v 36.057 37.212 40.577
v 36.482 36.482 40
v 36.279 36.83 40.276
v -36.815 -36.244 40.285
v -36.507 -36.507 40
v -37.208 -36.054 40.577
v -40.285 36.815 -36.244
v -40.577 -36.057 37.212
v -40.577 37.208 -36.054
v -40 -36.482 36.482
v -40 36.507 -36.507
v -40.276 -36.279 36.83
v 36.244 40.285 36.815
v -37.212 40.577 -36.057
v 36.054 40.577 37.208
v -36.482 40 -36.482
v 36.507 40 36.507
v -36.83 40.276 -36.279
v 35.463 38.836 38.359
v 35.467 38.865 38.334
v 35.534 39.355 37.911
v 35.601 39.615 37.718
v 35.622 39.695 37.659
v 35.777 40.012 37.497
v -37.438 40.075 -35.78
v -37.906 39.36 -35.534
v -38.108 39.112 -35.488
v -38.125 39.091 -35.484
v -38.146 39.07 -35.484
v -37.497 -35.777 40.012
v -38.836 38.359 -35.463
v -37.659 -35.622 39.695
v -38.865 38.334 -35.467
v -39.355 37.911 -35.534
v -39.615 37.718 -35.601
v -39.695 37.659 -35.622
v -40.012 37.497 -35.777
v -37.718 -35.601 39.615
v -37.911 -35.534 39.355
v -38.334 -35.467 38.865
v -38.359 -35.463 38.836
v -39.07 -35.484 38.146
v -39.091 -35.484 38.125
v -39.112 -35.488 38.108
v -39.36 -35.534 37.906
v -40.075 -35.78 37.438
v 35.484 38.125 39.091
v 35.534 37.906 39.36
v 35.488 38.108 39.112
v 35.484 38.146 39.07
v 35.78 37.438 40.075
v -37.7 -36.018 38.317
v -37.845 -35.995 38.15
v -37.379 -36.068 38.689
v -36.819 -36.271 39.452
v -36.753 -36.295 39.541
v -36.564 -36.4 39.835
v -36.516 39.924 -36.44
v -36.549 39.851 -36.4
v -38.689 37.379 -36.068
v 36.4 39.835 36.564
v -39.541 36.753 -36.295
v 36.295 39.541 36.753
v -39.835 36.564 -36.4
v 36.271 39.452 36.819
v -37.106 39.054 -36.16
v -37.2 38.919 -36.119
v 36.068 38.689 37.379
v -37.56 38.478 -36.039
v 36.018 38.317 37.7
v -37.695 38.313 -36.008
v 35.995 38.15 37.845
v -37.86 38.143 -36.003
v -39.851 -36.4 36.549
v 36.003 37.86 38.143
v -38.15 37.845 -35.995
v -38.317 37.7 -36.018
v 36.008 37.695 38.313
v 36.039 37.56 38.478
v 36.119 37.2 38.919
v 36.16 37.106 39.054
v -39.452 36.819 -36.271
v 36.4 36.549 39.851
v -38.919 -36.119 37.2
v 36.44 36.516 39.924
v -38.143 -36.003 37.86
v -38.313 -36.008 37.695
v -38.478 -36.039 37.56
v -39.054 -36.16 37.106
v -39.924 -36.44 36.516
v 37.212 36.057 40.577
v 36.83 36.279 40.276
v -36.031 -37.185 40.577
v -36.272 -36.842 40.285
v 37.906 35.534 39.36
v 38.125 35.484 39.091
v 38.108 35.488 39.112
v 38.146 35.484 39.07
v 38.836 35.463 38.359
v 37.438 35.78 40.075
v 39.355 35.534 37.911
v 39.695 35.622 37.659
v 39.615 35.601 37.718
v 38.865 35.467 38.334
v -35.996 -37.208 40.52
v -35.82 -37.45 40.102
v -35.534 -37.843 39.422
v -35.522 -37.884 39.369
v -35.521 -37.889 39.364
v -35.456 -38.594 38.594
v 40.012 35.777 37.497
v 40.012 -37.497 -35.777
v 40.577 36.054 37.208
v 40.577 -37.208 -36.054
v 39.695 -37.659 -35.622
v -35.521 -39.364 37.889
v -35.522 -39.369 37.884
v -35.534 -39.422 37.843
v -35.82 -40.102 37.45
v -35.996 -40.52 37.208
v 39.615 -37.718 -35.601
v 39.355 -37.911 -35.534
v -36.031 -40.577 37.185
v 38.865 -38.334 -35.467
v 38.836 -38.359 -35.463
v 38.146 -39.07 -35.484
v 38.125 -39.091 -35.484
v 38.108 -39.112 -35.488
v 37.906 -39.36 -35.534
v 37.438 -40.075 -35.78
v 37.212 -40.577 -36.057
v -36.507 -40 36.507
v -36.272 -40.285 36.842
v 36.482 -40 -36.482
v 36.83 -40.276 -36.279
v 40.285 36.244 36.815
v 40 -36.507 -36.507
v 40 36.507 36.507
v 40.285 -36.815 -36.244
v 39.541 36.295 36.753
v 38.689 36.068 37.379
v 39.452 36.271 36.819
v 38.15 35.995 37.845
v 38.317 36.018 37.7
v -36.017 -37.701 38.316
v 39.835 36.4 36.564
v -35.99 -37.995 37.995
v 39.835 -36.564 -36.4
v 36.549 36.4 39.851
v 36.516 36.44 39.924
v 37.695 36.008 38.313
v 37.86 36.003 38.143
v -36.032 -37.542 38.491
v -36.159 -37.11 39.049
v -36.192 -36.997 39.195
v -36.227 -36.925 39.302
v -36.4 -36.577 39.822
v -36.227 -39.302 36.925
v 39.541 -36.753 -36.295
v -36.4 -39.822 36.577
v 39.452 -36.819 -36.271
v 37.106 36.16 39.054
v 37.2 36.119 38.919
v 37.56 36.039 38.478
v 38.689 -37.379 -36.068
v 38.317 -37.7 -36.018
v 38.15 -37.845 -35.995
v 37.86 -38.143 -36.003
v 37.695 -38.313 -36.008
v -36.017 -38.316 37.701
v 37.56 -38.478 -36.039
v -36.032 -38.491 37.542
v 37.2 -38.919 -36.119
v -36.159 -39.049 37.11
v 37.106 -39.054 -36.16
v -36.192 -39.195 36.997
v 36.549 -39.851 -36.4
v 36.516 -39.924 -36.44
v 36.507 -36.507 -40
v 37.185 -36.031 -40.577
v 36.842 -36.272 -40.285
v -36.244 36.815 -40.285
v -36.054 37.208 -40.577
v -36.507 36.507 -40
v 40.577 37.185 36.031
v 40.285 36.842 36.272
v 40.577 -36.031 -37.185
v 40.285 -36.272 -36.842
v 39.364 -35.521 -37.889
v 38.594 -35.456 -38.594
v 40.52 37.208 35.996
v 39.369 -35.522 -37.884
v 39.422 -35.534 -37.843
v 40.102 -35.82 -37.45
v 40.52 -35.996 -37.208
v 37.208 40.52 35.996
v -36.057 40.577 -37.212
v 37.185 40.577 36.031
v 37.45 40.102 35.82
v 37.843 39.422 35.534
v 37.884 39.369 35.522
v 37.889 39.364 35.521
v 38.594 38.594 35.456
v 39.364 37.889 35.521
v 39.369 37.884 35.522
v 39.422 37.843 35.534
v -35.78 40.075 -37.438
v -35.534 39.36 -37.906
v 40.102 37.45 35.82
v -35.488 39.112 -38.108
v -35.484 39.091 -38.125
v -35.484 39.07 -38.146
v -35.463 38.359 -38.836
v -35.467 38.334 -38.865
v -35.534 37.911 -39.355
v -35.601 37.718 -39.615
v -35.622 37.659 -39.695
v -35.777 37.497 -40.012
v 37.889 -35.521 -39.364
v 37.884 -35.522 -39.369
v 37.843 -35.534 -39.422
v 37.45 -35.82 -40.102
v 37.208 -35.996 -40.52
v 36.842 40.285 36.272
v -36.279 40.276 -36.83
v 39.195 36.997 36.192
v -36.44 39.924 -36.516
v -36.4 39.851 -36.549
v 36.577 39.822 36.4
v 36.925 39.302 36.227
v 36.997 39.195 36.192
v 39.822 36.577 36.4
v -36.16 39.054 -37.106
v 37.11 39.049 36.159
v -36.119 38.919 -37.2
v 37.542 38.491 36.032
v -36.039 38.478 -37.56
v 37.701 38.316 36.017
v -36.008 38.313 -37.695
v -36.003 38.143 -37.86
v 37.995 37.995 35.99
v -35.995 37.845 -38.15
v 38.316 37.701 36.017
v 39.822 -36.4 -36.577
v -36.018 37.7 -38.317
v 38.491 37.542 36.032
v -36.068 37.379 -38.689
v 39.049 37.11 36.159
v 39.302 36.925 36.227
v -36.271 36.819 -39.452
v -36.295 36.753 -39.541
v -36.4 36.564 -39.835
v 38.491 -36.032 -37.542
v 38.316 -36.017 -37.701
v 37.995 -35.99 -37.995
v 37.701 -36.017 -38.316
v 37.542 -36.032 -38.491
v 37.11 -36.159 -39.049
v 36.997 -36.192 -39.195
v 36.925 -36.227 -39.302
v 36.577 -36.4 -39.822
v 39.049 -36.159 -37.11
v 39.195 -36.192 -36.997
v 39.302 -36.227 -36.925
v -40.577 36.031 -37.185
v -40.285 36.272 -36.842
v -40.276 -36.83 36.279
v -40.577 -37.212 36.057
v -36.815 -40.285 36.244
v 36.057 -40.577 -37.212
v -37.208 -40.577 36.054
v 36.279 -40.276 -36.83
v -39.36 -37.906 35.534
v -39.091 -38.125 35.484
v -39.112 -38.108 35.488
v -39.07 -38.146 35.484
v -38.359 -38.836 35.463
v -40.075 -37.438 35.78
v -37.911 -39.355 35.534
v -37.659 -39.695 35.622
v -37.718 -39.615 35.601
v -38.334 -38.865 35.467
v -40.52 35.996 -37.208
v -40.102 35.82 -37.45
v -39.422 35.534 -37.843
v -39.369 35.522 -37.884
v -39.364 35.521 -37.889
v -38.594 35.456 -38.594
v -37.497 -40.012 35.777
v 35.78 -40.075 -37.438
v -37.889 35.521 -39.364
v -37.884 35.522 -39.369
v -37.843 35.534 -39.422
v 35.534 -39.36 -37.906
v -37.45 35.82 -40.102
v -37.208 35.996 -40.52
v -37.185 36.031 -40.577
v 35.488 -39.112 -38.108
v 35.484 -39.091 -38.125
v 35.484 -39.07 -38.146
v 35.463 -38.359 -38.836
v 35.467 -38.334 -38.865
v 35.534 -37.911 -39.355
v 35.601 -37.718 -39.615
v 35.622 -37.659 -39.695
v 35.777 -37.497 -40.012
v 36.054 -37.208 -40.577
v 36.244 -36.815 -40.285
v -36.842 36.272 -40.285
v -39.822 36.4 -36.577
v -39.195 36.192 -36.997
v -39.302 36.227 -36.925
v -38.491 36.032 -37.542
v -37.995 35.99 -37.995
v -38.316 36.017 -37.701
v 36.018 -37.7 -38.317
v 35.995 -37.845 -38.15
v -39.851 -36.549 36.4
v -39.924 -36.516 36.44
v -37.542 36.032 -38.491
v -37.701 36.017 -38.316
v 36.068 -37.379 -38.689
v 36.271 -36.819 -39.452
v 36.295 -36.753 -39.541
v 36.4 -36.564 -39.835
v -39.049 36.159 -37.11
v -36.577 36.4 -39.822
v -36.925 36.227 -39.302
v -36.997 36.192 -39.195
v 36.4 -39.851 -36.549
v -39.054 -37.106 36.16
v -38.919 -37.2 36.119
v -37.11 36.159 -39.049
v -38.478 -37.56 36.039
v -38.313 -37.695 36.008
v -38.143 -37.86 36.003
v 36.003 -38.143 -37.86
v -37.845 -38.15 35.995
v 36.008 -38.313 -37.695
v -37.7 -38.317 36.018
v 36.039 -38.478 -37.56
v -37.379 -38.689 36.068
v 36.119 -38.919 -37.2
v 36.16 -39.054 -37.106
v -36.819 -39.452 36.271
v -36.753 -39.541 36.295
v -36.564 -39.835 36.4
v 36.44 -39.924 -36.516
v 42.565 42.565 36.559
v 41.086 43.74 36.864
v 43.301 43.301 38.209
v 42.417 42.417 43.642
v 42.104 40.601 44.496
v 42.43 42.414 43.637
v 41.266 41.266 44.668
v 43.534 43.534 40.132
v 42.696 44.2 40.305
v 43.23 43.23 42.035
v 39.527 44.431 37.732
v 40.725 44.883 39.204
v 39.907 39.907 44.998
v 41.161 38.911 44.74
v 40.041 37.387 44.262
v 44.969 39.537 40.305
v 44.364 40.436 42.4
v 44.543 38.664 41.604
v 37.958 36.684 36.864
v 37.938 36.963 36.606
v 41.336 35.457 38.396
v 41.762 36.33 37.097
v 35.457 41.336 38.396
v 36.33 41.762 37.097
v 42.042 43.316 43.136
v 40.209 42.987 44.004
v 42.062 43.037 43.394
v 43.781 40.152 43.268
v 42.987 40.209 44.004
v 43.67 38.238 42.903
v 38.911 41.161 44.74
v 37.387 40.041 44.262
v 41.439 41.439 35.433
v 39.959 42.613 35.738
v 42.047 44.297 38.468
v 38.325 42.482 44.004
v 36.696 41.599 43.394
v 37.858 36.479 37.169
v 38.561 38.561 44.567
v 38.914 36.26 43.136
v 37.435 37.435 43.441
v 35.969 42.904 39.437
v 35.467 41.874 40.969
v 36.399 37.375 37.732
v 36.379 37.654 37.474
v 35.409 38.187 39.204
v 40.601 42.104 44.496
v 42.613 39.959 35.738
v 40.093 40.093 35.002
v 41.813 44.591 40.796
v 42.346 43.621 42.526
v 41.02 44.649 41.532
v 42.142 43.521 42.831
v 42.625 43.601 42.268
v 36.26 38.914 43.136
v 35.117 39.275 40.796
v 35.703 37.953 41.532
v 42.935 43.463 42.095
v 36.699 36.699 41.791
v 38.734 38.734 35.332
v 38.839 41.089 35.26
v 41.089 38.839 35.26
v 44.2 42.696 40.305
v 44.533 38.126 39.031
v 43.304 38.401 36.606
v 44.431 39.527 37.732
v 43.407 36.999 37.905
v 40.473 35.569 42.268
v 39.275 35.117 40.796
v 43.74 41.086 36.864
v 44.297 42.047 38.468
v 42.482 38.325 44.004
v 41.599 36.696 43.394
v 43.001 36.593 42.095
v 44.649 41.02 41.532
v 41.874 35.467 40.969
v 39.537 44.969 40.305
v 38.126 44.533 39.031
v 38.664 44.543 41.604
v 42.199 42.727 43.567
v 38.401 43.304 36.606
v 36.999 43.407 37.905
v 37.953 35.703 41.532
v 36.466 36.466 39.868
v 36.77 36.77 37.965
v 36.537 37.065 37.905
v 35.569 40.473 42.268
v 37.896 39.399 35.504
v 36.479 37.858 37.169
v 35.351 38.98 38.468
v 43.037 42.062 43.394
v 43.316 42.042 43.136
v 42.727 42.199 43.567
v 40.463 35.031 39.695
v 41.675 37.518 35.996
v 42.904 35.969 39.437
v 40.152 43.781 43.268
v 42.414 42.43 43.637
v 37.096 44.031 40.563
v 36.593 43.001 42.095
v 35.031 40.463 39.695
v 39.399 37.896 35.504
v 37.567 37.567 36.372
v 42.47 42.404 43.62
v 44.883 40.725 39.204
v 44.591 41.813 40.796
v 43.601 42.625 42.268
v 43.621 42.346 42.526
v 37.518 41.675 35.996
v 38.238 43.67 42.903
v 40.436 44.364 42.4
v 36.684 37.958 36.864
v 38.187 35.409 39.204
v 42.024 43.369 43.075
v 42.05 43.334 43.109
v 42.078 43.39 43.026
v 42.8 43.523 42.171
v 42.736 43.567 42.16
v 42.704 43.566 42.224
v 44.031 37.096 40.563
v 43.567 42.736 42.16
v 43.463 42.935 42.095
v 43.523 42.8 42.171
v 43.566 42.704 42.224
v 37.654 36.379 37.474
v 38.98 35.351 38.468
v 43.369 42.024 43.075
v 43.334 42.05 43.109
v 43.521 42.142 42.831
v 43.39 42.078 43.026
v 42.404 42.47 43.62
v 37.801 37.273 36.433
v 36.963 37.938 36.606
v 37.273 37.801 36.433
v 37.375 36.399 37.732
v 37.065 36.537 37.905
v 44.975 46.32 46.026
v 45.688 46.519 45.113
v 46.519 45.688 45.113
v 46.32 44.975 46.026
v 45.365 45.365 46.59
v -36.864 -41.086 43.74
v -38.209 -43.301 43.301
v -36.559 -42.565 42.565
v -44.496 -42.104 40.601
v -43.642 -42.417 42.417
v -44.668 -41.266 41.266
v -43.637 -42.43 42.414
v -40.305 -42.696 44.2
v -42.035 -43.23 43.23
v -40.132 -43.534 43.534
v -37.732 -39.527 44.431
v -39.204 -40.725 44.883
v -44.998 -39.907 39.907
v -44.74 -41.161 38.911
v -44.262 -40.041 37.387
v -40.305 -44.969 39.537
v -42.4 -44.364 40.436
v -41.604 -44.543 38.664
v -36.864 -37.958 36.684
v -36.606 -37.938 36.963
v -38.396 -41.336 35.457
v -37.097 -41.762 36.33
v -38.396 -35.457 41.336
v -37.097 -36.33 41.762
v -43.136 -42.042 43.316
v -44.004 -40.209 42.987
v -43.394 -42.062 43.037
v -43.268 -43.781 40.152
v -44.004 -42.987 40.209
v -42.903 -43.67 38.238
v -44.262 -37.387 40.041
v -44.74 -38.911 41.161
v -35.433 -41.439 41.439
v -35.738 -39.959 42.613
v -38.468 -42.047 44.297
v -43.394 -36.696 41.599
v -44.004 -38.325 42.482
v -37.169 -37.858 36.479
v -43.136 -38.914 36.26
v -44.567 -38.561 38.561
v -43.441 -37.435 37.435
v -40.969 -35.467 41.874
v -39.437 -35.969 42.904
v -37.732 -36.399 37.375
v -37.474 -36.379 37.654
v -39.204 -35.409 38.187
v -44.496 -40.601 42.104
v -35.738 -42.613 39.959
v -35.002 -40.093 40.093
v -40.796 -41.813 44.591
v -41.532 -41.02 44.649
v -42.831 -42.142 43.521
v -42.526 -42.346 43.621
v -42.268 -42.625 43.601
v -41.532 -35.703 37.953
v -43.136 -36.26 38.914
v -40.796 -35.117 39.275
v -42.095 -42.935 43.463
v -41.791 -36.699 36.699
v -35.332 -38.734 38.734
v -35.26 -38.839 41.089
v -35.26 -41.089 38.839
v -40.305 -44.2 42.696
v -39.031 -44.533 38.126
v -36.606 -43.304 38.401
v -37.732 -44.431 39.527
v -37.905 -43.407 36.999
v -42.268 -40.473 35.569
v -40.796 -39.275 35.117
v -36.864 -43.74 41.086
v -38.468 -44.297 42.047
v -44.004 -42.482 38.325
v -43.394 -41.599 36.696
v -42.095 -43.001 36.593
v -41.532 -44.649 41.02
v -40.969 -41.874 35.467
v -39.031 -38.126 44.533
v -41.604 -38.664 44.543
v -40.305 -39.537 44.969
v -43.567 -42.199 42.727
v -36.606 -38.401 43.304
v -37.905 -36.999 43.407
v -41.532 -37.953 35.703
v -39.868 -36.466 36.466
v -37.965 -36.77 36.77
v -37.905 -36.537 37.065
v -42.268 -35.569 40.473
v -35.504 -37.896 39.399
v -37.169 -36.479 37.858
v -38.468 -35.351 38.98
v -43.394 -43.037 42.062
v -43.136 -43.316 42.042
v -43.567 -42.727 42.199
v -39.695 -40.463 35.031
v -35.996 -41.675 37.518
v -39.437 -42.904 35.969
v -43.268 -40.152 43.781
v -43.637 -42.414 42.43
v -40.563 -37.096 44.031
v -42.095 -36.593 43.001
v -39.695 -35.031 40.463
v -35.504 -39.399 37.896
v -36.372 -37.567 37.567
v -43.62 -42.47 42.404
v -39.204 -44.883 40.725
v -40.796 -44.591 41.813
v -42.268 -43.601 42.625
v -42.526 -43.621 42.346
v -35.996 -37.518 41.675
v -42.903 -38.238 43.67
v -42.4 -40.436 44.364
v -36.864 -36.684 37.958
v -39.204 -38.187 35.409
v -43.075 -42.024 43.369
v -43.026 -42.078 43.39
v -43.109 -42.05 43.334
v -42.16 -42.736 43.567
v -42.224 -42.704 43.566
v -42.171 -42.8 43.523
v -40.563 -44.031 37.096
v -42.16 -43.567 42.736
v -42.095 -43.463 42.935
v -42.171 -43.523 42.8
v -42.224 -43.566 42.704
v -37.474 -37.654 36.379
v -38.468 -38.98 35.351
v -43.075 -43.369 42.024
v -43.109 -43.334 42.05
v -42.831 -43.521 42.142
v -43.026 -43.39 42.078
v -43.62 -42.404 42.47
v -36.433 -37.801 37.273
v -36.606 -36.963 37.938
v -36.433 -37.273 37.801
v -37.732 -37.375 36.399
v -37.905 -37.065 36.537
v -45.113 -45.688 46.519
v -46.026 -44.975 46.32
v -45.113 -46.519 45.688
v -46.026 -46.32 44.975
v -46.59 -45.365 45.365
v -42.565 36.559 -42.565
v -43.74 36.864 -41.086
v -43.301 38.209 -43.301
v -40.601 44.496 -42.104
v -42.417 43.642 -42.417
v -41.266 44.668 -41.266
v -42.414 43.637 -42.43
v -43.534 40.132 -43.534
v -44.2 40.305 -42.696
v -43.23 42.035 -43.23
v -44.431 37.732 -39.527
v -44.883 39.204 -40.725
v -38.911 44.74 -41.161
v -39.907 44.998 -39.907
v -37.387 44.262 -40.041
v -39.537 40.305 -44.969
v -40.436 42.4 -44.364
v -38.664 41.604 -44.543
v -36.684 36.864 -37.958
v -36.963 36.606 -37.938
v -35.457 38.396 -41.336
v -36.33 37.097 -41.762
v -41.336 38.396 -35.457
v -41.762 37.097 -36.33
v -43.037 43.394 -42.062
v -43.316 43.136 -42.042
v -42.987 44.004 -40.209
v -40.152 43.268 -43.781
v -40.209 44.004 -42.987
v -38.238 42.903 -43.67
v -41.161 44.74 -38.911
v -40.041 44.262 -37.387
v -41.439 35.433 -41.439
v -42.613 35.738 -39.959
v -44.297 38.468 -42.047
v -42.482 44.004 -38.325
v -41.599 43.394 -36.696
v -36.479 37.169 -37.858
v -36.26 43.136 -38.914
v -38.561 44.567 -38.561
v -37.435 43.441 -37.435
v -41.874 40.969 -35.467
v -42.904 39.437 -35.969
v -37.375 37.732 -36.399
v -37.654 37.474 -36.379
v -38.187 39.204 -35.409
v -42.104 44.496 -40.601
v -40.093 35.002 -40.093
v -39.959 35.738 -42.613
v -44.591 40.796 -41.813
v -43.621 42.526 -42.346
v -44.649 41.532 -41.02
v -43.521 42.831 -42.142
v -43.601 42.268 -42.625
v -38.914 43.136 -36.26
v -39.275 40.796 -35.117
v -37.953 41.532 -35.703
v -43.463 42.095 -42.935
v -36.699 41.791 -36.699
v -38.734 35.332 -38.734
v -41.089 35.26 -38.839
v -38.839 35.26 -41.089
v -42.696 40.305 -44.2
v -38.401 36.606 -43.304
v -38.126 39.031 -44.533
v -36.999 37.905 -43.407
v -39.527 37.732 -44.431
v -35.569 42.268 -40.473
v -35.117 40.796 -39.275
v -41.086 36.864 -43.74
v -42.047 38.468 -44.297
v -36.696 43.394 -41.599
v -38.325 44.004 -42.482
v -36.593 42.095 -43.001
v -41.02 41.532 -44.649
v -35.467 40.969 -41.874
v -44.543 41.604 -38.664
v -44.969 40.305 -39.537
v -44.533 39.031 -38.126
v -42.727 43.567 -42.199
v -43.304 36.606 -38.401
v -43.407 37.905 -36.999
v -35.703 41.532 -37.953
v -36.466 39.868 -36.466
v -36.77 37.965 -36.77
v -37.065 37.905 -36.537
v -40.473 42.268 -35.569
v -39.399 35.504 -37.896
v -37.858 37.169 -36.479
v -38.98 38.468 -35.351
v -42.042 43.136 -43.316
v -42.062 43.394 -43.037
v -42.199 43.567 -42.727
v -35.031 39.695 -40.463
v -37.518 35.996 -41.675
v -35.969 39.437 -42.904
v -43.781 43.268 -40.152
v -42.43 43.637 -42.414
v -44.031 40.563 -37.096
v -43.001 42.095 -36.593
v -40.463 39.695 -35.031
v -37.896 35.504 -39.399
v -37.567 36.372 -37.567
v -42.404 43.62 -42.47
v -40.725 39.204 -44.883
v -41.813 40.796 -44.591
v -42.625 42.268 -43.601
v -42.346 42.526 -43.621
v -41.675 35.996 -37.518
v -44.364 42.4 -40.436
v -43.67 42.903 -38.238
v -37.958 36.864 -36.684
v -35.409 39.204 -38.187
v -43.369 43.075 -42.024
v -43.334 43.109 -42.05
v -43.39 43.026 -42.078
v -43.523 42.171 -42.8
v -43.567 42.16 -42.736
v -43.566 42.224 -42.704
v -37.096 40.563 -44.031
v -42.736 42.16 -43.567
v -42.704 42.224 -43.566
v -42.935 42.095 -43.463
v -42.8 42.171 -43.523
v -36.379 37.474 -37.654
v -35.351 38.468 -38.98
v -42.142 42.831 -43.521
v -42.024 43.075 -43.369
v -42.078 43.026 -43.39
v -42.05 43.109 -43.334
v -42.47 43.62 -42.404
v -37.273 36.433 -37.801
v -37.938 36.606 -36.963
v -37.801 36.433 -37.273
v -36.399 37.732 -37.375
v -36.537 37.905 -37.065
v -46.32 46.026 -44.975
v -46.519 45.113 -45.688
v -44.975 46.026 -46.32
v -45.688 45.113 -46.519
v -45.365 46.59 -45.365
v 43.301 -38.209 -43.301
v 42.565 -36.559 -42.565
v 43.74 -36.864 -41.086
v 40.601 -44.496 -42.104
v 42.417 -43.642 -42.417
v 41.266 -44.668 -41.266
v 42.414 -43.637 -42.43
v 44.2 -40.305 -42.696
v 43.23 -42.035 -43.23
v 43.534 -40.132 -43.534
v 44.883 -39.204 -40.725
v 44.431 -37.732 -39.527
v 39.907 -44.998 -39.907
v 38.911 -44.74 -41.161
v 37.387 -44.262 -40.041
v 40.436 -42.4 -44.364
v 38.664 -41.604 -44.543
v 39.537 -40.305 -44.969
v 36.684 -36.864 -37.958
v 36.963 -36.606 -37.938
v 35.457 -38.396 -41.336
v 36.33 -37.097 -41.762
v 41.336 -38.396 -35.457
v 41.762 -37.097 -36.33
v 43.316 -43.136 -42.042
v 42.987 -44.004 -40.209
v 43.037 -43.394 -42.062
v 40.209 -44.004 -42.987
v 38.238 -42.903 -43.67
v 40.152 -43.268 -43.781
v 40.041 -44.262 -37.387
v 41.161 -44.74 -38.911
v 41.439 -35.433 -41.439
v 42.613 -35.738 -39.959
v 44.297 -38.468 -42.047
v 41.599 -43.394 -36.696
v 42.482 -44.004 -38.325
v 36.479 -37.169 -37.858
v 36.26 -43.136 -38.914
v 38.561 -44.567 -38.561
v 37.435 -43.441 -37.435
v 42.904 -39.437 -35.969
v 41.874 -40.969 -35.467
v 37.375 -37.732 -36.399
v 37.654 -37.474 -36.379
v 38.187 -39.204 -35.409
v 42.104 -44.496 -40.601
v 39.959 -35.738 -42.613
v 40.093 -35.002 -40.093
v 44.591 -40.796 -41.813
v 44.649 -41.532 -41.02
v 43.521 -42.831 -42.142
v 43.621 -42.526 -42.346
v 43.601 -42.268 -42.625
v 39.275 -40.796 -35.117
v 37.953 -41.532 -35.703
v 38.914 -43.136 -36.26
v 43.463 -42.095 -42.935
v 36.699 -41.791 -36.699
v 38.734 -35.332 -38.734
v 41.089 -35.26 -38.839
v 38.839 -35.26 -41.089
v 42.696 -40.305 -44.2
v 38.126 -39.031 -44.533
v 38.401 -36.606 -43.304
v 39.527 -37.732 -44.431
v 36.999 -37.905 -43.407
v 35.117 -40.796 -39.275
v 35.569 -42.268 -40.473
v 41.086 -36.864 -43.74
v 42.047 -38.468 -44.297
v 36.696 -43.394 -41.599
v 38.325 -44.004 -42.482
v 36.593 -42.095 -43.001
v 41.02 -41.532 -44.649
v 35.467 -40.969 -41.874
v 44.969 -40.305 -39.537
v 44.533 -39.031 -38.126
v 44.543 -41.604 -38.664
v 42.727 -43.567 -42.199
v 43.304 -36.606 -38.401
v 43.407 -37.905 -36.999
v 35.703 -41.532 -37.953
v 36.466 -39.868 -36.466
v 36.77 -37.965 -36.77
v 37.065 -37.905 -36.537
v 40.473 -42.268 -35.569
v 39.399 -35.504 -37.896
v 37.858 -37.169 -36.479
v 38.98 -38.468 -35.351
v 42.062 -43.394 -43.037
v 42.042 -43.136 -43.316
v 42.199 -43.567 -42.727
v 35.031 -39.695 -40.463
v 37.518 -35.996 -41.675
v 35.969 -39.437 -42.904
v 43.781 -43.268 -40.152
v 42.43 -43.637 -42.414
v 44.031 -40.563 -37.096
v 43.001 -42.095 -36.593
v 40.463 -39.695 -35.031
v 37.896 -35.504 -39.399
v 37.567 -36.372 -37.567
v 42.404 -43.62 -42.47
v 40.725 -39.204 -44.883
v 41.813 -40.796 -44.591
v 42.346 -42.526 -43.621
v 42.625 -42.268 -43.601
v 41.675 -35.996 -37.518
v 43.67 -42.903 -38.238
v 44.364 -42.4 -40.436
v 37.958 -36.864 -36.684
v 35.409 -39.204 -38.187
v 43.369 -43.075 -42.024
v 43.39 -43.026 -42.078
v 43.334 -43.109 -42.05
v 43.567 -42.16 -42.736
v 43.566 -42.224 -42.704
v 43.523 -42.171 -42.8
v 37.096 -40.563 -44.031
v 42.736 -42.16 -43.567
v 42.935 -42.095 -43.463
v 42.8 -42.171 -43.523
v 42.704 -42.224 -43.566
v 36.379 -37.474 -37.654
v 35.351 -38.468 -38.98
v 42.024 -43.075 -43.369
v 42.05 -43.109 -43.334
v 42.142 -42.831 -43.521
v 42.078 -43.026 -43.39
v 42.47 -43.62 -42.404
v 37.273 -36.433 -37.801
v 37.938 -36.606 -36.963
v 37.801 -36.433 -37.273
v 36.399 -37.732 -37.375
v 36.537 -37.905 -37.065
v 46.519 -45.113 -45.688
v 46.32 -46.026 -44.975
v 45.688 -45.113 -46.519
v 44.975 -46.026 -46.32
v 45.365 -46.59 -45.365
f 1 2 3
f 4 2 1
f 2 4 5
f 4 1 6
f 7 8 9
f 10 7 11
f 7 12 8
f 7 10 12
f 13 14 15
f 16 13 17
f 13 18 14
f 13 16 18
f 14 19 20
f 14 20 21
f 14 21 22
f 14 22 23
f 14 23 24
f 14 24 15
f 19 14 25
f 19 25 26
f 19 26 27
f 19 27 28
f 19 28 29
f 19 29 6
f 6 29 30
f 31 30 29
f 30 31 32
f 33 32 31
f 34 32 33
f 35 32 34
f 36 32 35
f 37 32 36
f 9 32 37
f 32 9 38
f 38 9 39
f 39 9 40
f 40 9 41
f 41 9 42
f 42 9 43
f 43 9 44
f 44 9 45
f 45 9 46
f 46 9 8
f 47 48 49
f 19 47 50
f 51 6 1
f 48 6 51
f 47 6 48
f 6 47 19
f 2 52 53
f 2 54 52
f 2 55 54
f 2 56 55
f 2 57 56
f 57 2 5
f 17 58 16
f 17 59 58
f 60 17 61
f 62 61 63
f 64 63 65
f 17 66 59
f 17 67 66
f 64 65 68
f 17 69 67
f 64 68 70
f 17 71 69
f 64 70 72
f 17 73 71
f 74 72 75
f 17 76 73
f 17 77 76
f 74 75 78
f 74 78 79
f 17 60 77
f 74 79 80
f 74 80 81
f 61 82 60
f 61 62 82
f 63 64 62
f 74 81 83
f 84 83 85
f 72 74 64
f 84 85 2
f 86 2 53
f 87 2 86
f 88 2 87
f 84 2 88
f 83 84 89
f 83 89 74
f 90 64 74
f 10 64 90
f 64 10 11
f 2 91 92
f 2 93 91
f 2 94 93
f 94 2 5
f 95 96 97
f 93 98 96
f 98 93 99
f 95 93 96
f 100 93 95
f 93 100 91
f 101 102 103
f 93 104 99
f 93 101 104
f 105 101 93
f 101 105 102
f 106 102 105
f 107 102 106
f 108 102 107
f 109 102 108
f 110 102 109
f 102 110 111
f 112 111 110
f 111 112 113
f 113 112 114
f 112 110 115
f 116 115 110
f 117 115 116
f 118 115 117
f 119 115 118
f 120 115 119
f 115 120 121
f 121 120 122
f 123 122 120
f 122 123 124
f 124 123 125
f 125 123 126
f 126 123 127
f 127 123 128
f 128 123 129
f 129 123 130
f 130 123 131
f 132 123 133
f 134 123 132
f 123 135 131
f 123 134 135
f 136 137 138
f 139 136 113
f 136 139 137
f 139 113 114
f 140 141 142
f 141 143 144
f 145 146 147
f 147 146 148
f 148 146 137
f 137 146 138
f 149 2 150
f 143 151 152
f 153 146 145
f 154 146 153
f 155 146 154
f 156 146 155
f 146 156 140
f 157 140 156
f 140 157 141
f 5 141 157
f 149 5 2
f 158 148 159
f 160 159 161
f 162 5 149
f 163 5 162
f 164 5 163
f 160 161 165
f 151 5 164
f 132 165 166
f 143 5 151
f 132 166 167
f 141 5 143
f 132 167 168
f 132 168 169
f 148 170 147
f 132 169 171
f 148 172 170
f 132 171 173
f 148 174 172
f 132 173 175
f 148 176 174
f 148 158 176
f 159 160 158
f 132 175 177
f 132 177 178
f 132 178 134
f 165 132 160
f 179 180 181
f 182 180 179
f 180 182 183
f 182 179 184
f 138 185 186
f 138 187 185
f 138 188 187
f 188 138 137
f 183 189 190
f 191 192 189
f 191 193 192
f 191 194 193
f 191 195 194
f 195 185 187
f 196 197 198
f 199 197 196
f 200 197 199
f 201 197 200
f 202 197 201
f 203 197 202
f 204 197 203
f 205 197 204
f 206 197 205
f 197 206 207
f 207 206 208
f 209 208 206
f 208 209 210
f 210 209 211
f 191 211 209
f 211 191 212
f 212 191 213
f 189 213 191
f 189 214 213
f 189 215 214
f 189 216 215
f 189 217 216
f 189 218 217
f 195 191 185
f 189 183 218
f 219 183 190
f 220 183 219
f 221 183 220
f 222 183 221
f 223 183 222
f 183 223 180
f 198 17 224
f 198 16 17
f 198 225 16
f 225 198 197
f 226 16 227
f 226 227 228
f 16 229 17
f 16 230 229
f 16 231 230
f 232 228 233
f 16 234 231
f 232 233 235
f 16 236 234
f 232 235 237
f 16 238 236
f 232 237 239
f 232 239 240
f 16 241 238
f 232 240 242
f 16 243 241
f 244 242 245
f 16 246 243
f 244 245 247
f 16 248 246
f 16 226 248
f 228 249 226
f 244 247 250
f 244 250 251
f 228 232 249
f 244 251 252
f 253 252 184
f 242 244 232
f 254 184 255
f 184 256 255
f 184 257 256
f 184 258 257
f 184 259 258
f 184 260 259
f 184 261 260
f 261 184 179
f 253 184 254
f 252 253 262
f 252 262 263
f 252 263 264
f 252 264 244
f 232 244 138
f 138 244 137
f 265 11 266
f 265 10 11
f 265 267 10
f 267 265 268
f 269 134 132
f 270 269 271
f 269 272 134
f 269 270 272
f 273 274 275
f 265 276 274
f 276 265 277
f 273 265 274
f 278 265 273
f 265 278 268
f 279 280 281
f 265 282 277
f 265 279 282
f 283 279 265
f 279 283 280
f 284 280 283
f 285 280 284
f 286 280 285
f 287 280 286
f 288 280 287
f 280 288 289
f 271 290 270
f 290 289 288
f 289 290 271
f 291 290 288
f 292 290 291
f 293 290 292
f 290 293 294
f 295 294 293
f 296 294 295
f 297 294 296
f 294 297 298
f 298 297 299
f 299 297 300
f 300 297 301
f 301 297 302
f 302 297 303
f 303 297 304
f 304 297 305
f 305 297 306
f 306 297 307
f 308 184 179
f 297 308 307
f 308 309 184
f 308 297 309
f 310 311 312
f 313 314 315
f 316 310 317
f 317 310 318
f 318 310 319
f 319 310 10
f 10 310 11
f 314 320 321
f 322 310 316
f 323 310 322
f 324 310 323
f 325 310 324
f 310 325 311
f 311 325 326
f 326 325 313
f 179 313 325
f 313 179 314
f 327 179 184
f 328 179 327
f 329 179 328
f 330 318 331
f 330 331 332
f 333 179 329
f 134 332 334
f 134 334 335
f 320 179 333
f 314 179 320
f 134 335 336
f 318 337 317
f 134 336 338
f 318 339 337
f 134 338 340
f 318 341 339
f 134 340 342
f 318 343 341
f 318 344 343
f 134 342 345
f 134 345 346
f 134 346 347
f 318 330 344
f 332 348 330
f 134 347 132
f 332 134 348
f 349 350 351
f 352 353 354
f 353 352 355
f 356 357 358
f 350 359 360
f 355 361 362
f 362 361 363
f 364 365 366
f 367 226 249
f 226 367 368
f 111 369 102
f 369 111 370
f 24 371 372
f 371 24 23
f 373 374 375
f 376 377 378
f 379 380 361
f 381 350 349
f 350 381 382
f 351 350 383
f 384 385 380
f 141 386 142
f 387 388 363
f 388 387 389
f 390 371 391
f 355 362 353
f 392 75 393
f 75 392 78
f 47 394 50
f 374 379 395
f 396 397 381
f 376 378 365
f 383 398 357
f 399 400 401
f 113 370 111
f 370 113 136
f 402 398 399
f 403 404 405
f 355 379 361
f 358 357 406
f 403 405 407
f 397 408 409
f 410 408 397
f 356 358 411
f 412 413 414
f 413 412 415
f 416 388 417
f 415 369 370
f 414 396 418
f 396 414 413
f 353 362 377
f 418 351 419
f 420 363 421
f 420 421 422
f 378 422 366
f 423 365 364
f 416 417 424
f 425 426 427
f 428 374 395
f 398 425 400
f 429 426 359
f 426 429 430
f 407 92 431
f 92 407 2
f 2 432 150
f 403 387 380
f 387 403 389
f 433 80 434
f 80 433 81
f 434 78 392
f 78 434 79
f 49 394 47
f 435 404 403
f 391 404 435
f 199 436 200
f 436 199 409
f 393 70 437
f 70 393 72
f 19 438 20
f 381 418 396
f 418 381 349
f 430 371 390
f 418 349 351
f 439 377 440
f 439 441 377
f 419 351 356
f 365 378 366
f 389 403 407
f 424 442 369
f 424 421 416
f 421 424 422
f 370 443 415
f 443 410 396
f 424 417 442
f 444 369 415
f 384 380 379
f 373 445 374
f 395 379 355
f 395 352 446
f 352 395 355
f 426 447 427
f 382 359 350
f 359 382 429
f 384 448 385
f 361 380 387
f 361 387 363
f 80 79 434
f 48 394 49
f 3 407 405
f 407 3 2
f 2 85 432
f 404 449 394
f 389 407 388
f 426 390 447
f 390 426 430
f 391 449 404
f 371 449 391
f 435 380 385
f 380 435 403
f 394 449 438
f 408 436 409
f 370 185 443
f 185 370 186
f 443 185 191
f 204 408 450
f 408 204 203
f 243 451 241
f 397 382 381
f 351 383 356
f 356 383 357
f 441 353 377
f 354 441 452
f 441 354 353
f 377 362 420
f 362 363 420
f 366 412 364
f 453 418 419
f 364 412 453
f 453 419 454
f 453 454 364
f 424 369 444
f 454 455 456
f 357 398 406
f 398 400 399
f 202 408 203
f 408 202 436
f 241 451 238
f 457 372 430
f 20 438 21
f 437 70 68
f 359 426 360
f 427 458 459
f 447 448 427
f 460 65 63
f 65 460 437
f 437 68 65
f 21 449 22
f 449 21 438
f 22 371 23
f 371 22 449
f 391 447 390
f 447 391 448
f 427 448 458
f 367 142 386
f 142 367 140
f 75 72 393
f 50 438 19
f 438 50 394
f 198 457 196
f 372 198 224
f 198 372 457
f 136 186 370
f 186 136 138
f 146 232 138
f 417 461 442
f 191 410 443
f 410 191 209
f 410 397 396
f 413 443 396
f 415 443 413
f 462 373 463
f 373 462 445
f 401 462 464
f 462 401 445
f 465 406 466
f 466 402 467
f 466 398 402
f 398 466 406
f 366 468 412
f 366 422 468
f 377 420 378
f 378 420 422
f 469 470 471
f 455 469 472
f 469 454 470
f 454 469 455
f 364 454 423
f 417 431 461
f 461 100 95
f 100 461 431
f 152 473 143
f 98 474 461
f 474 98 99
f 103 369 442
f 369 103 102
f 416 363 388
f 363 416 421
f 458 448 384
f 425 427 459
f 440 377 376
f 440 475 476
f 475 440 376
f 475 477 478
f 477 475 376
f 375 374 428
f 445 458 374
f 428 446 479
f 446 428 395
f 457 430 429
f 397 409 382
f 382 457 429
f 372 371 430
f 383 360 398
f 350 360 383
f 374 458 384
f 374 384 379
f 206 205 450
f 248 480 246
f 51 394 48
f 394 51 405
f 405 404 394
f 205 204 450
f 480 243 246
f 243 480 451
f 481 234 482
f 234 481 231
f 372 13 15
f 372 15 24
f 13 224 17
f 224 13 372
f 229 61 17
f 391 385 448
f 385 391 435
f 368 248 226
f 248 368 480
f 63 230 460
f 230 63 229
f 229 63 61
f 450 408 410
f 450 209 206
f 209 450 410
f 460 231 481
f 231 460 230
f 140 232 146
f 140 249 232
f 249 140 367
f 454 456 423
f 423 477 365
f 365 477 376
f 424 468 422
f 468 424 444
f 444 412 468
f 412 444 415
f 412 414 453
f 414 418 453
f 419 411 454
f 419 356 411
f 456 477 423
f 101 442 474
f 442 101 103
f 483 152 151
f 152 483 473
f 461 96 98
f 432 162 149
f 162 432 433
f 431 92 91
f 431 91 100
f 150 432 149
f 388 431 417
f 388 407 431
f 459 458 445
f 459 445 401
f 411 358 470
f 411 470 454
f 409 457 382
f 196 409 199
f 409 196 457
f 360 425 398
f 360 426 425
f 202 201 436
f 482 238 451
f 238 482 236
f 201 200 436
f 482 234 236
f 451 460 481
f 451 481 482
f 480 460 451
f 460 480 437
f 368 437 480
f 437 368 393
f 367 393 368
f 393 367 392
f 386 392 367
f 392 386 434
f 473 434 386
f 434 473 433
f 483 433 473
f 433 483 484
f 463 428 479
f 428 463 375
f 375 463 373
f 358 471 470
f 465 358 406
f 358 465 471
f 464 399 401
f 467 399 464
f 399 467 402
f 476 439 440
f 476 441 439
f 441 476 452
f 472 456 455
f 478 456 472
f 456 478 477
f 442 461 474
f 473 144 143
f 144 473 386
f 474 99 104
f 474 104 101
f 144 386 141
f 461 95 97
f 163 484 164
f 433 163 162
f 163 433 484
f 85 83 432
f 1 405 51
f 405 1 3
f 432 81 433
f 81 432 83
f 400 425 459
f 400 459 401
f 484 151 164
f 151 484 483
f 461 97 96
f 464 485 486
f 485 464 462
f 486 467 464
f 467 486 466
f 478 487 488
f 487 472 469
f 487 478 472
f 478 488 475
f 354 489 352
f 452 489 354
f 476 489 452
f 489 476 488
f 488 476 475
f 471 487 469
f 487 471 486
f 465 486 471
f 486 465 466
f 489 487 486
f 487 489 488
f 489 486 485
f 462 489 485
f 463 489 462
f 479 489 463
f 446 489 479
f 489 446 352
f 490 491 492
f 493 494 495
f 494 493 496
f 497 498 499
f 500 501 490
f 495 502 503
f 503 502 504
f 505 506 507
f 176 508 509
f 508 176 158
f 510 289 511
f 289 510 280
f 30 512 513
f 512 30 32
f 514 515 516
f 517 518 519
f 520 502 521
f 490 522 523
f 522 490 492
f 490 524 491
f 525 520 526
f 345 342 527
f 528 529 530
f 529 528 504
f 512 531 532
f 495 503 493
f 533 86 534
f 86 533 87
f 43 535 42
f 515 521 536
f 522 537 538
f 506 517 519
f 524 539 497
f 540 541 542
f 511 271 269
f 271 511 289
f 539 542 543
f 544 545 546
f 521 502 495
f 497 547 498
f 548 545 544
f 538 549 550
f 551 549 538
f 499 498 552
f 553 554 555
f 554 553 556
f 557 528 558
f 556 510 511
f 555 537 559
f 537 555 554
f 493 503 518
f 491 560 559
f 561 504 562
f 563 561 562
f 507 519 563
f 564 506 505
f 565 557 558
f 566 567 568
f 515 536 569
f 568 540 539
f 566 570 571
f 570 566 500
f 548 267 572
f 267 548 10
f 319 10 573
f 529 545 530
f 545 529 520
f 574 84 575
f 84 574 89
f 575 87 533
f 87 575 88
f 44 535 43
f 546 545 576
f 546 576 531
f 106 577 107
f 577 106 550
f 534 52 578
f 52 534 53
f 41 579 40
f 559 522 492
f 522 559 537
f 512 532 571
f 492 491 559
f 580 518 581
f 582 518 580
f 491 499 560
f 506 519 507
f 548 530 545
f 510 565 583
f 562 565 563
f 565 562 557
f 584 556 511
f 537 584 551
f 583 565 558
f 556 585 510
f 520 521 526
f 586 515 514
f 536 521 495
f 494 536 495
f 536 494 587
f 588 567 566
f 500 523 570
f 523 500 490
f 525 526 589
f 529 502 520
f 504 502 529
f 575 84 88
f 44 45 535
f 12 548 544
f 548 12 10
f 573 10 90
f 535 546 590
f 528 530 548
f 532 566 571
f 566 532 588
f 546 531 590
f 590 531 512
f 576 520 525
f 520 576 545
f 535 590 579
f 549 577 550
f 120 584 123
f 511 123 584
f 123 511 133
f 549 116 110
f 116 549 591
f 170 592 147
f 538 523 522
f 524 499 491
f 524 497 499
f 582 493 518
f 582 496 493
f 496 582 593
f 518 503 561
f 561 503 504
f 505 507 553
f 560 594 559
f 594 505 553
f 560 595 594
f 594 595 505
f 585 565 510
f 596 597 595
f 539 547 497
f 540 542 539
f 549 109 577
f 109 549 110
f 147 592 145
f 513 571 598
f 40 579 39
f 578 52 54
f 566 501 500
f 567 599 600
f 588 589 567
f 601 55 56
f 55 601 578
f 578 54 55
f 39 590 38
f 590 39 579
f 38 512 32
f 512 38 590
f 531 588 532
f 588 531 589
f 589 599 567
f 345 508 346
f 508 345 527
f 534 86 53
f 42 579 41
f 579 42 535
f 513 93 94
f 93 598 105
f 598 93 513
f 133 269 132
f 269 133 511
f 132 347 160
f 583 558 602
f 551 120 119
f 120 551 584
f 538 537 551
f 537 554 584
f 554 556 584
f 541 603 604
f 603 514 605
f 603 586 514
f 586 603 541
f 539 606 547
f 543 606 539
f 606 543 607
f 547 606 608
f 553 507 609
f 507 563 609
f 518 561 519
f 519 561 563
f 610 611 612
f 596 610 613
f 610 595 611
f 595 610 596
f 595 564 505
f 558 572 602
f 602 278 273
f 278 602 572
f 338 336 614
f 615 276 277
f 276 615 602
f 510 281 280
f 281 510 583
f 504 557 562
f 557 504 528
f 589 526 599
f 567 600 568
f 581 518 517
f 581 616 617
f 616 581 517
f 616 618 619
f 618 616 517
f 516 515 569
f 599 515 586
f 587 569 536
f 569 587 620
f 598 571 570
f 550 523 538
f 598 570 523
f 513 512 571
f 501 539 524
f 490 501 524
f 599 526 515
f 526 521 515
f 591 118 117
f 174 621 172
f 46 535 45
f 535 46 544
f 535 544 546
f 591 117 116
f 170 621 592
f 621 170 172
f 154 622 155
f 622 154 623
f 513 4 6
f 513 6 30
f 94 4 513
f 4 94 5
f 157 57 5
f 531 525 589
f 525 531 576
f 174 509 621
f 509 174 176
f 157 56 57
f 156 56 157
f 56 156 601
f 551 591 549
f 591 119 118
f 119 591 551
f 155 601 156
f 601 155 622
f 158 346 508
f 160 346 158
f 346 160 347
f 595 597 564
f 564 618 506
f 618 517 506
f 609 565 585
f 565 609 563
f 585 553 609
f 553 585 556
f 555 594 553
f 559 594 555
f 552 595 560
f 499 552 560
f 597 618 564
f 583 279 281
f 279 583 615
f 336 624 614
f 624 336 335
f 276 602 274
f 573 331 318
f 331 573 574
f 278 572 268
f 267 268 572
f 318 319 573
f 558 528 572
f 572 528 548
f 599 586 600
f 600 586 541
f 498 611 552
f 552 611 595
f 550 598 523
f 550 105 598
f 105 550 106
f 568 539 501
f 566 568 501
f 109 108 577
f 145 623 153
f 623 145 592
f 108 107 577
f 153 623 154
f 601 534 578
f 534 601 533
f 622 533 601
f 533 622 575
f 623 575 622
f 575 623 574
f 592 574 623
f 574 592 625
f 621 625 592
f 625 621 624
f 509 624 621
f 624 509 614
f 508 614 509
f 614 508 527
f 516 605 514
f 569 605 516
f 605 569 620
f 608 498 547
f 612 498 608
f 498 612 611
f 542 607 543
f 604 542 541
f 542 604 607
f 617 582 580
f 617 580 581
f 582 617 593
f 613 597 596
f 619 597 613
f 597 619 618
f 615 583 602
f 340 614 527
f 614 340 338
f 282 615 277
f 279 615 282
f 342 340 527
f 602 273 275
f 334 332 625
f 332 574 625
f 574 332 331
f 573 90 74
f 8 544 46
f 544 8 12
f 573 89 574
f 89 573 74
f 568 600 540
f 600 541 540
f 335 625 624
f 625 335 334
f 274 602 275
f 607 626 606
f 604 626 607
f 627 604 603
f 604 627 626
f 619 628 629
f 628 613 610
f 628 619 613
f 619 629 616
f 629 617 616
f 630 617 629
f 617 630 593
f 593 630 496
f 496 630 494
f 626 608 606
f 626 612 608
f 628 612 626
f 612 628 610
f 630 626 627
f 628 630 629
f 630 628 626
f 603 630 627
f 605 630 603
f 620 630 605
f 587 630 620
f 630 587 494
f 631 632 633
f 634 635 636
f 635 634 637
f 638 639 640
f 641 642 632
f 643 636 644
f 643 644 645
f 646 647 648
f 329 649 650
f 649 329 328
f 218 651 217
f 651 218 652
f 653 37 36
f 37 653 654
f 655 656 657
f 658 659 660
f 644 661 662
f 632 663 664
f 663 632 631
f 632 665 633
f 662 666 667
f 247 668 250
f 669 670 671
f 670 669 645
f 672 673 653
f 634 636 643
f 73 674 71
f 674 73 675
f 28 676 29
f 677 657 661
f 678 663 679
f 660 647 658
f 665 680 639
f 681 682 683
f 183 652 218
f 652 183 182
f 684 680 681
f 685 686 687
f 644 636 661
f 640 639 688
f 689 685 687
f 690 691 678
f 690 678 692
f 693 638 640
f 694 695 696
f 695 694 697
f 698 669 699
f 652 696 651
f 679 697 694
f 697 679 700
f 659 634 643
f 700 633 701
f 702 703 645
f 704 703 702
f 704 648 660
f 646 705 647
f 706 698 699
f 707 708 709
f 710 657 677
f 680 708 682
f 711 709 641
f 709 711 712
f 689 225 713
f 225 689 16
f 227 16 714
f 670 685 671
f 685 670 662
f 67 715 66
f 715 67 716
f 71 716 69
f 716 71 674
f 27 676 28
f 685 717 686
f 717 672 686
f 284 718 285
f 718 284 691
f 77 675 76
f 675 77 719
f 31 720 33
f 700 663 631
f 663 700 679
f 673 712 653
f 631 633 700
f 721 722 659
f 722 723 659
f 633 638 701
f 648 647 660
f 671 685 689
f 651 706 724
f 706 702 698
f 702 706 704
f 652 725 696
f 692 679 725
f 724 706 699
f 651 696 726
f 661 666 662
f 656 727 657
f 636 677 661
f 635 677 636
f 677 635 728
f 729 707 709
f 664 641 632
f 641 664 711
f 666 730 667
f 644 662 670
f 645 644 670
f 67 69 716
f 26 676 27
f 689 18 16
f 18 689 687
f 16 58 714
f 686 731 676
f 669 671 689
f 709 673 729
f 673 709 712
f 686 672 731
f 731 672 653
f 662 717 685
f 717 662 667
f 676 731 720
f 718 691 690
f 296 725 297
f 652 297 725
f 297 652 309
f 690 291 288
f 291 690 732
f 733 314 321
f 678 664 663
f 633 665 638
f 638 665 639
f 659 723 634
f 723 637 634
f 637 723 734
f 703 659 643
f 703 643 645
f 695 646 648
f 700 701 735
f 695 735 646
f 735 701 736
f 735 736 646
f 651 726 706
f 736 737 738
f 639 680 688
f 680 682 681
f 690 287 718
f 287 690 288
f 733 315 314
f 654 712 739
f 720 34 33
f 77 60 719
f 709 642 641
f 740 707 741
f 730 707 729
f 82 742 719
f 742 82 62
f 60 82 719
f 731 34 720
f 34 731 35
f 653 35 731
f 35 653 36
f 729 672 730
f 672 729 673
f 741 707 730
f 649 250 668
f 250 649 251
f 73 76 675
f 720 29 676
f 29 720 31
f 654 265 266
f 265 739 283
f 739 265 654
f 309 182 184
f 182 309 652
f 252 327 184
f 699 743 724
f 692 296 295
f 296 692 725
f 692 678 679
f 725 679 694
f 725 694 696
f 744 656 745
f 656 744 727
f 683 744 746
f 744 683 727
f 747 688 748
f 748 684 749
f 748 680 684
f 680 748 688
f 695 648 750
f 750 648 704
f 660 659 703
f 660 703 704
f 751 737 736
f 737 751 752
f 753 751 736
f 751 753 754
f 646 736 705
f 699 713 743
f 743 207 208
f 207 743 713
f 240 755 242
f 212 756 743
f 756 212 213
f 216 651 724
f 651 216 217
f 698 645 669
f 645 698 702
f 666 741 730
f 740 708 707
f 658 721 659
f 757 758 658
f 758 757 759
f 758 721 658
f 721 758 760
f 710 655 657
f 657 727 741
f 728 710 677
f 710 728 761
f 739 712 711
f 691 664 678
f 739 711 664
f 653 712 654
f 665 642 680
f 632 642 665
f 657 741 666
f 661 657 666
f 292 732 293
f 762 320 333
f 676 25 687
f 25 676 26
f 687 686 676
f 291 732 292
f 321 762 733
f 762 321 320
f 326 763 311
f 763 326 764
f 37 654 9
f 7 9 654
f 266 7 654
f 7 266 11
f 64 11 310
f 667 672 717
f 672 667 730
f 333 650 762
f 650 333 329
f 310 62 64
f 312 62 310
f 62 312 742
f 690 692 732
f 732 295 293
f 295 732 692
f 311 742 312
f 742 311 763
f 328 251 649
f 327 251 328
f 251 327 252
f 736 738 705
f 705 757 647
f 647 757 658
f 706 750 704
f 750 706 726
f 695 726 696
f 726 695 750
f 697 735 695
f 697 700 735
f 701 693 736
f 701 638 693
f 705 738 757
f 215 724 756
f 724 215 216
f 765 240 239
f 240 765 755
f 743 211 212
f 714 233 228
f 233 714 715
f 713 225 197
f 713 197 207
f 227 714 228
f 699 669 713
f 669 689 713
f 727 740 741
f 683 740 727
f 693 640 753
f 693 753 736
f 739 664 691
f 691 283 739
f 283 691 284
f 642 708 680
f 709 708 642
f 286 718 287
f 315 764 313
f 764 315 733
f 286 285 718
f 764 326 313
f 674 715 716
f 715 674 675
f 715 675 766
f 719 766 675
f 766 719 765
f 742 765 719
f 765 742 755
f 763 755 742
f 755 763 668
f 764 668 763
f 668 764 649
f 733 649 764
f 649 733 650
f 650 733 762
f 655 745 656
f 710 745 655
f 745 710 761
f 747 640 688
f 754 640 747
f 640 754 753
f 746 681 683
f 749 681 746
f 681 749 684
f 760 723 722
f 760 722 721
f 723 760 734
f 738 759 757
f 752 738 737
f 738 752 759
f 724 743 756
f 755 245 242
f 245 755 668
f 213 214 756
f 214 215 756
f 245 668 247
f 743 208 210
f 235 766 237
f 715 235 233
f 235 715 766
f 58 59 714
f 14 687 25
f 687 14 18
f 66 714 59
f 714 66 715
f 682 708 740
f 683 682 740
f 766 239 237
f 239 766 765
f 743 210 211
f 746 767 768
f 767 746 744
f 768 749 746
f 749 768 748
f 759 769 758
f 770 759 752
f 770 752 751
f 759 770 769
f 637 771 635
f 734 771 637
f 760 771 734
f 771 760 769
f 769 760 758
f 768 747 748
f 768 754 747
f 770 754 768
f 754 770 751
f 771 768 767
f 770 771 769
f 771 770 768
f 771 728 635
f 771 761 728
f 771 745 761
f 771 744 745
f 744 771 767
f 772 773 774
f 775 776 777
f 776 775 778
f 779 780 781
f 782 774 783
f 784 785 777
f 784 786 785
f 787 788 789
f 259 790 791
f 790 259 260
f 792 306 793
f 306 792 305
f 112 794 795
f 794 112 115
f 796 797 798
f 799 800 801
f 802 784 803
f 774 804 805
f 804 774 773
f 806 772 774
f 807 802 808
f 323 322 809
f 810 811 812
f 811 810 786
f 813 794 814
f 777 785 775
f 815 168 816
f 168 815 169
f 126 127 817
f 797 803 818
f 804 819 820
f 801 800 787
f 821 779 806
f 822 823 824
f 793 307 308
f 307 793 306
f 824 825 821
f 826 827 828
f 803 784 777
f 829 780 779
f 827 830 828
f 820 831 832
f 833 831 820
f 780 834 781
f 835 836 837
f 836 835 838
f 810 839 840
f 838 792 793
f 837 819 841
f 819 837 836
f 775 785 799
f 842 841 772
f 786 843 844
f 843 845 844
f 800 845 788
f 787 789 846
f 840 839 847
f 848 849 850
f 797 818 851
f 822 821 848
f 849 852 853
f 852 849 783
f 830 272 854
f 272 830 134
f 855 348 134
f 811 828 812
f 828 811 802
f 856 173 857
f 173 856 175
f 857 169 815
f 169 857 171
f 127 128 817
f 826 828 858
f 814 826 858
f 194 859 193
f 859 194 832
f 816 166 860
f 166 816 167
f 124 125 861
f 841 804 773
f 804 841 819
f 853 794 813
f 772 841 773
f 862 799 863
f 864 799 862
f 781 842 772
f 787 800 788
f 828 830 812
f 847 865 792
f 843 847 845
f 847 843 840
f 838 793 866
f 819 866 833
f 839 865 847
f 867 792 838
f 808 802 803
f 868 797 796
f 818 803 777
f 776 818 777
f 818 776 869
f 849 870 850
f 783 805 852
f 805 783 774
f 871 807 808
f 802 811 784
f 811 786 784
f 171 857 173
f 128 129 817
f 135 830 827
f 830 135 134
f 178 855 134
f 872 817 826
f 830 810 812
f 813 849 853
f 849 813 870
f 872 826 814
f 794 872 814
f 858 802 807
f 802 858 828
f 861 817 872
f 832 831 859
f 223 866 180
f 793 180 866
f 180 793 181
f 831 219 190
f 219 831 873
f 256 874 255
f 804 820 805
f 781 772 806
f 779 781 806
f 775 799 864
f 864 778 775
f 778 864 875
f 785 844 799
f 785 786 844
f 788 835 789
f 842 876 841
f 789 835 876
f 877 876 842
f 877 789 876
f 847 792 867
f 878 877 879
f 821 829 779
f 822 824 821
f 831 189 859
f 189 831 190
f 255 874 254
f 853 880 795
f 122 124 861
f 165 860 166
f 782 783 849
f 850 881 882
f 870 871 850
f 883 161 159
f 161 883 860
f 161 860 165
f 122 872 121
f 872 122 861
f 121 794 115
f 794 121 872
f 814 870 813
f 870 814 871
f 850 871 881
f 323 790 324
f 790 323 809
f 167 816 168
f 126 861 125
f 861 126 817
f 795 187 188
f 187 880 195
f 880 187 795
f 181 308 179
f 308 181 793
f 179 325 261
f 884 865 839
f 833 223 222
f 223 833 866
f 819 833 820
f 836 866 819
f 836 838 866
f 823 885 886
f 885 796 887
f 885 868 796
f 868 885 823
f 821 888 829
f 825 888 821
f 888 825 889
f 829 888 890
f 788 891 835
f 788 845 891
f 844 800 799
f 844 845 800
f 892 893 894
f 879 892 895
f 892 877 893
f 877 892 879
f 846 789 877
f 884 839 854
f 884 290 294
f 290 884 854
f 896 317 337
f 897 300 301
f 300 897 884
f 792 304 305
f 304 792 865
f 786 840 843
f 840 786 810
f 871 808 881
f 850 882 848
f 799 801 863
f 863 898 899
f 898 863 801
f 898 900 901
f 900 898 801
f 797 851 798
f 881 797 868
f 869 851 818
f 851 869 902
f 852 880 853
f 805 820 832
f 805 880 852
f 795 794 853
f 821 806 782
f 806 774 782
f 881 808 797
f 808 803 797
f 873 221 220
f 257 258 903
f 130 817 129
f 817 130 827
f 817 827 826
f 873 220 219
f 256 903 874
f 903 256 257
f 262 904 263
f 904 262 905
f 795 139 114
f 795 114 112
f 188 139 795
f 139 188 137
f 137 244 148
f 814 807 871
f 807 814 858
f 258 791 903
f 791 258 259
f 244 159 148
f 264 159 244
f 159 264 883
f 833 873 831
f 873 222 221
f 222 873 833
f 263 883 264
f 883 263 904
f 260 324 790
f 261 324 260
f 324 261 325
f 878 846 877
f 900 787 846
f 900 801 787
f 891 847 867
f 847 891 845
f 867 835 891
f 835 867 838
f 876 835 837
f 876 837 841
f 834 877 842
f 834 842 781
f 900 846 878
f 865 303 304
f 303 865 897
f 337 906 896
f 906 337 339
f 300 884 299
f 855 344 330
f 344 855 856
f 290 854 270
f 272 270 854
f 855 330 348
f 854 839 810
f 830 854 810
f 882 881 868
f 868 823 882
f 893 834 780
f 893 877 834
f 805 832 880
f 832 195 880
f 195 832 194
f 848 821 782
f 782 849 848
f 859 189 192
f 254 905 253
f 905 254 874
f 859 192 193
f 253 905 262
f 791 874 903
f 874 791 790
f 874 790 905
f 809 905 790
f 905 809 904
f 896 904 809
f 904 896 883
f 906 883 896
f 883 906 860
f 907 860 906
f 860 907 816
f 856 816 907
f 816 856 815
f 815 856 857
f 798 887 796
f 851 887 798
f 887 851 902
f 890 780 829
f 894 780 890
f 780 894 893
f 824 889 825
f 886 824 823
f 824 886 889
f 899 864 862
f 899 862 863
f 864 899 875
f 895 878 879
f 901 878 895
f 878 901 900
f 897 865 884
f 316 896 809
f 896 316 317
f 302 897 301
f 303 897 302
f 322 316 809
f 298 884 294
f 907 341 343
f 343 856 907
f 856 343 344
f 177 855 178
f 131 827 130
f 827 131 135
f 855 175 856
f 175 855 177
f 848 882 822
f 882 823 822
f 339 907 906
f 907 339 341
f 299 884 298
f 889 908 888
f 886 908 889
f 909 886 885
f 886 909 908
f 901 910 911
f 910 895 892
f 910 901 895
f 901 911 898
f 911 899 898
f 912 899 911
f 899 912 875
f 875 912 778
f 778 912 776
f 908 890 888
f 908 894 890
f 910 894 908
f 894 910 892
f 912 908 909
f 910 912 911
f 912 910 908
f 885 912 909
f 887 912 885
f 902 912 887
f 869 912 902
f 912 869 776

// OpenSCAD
/*
 * This file is part of PolySymmetrica, a Polyhedral Geometry Modelling System.
 * Copyright 2025-2026 Susan Witts
 * SPDX-License-Identifier: MIT
 */

use <../core/funcs.scad>
use <../core/placement.scad>

// ---- Canonical Tetrahedron (edge length = 2*sqrt(2)) ----
function tetrahedron() = let(unit_edge = 2 * sqrt(2)) poly_make(
    // verts (index 0)
    [
        [ 1,  1,  1],   // 0
        [-1, -1,  1],   // 1
        [-1,  1, -1],   // 2
        [ 1, -1, -1]    // 3
    ]/ unit_edge,

    // faces (index 1) – triangles by vertex index, oriented for LHR (OpenSCAD)
    [
        [0, 1, 2],
        [0, 3, 1],
        [0, 2, 3],
        [1, 3, 2]
    ],

    // e_over_ir (index 3): edge_len / inter_radius
    2 * sqrt(2)
);


//////
// TEST DEMOS
//////

place_on_faces(tetrahedron(), 40) {
    cylinder($fn = 3, r = $ps_face_radius);
}

place_on_vertices(tetrahedron(), 40) {
    color("red") sphere(5);
    color("blue") cylinder(h = 10, r = 1, center = false);  // along local +Z
}
